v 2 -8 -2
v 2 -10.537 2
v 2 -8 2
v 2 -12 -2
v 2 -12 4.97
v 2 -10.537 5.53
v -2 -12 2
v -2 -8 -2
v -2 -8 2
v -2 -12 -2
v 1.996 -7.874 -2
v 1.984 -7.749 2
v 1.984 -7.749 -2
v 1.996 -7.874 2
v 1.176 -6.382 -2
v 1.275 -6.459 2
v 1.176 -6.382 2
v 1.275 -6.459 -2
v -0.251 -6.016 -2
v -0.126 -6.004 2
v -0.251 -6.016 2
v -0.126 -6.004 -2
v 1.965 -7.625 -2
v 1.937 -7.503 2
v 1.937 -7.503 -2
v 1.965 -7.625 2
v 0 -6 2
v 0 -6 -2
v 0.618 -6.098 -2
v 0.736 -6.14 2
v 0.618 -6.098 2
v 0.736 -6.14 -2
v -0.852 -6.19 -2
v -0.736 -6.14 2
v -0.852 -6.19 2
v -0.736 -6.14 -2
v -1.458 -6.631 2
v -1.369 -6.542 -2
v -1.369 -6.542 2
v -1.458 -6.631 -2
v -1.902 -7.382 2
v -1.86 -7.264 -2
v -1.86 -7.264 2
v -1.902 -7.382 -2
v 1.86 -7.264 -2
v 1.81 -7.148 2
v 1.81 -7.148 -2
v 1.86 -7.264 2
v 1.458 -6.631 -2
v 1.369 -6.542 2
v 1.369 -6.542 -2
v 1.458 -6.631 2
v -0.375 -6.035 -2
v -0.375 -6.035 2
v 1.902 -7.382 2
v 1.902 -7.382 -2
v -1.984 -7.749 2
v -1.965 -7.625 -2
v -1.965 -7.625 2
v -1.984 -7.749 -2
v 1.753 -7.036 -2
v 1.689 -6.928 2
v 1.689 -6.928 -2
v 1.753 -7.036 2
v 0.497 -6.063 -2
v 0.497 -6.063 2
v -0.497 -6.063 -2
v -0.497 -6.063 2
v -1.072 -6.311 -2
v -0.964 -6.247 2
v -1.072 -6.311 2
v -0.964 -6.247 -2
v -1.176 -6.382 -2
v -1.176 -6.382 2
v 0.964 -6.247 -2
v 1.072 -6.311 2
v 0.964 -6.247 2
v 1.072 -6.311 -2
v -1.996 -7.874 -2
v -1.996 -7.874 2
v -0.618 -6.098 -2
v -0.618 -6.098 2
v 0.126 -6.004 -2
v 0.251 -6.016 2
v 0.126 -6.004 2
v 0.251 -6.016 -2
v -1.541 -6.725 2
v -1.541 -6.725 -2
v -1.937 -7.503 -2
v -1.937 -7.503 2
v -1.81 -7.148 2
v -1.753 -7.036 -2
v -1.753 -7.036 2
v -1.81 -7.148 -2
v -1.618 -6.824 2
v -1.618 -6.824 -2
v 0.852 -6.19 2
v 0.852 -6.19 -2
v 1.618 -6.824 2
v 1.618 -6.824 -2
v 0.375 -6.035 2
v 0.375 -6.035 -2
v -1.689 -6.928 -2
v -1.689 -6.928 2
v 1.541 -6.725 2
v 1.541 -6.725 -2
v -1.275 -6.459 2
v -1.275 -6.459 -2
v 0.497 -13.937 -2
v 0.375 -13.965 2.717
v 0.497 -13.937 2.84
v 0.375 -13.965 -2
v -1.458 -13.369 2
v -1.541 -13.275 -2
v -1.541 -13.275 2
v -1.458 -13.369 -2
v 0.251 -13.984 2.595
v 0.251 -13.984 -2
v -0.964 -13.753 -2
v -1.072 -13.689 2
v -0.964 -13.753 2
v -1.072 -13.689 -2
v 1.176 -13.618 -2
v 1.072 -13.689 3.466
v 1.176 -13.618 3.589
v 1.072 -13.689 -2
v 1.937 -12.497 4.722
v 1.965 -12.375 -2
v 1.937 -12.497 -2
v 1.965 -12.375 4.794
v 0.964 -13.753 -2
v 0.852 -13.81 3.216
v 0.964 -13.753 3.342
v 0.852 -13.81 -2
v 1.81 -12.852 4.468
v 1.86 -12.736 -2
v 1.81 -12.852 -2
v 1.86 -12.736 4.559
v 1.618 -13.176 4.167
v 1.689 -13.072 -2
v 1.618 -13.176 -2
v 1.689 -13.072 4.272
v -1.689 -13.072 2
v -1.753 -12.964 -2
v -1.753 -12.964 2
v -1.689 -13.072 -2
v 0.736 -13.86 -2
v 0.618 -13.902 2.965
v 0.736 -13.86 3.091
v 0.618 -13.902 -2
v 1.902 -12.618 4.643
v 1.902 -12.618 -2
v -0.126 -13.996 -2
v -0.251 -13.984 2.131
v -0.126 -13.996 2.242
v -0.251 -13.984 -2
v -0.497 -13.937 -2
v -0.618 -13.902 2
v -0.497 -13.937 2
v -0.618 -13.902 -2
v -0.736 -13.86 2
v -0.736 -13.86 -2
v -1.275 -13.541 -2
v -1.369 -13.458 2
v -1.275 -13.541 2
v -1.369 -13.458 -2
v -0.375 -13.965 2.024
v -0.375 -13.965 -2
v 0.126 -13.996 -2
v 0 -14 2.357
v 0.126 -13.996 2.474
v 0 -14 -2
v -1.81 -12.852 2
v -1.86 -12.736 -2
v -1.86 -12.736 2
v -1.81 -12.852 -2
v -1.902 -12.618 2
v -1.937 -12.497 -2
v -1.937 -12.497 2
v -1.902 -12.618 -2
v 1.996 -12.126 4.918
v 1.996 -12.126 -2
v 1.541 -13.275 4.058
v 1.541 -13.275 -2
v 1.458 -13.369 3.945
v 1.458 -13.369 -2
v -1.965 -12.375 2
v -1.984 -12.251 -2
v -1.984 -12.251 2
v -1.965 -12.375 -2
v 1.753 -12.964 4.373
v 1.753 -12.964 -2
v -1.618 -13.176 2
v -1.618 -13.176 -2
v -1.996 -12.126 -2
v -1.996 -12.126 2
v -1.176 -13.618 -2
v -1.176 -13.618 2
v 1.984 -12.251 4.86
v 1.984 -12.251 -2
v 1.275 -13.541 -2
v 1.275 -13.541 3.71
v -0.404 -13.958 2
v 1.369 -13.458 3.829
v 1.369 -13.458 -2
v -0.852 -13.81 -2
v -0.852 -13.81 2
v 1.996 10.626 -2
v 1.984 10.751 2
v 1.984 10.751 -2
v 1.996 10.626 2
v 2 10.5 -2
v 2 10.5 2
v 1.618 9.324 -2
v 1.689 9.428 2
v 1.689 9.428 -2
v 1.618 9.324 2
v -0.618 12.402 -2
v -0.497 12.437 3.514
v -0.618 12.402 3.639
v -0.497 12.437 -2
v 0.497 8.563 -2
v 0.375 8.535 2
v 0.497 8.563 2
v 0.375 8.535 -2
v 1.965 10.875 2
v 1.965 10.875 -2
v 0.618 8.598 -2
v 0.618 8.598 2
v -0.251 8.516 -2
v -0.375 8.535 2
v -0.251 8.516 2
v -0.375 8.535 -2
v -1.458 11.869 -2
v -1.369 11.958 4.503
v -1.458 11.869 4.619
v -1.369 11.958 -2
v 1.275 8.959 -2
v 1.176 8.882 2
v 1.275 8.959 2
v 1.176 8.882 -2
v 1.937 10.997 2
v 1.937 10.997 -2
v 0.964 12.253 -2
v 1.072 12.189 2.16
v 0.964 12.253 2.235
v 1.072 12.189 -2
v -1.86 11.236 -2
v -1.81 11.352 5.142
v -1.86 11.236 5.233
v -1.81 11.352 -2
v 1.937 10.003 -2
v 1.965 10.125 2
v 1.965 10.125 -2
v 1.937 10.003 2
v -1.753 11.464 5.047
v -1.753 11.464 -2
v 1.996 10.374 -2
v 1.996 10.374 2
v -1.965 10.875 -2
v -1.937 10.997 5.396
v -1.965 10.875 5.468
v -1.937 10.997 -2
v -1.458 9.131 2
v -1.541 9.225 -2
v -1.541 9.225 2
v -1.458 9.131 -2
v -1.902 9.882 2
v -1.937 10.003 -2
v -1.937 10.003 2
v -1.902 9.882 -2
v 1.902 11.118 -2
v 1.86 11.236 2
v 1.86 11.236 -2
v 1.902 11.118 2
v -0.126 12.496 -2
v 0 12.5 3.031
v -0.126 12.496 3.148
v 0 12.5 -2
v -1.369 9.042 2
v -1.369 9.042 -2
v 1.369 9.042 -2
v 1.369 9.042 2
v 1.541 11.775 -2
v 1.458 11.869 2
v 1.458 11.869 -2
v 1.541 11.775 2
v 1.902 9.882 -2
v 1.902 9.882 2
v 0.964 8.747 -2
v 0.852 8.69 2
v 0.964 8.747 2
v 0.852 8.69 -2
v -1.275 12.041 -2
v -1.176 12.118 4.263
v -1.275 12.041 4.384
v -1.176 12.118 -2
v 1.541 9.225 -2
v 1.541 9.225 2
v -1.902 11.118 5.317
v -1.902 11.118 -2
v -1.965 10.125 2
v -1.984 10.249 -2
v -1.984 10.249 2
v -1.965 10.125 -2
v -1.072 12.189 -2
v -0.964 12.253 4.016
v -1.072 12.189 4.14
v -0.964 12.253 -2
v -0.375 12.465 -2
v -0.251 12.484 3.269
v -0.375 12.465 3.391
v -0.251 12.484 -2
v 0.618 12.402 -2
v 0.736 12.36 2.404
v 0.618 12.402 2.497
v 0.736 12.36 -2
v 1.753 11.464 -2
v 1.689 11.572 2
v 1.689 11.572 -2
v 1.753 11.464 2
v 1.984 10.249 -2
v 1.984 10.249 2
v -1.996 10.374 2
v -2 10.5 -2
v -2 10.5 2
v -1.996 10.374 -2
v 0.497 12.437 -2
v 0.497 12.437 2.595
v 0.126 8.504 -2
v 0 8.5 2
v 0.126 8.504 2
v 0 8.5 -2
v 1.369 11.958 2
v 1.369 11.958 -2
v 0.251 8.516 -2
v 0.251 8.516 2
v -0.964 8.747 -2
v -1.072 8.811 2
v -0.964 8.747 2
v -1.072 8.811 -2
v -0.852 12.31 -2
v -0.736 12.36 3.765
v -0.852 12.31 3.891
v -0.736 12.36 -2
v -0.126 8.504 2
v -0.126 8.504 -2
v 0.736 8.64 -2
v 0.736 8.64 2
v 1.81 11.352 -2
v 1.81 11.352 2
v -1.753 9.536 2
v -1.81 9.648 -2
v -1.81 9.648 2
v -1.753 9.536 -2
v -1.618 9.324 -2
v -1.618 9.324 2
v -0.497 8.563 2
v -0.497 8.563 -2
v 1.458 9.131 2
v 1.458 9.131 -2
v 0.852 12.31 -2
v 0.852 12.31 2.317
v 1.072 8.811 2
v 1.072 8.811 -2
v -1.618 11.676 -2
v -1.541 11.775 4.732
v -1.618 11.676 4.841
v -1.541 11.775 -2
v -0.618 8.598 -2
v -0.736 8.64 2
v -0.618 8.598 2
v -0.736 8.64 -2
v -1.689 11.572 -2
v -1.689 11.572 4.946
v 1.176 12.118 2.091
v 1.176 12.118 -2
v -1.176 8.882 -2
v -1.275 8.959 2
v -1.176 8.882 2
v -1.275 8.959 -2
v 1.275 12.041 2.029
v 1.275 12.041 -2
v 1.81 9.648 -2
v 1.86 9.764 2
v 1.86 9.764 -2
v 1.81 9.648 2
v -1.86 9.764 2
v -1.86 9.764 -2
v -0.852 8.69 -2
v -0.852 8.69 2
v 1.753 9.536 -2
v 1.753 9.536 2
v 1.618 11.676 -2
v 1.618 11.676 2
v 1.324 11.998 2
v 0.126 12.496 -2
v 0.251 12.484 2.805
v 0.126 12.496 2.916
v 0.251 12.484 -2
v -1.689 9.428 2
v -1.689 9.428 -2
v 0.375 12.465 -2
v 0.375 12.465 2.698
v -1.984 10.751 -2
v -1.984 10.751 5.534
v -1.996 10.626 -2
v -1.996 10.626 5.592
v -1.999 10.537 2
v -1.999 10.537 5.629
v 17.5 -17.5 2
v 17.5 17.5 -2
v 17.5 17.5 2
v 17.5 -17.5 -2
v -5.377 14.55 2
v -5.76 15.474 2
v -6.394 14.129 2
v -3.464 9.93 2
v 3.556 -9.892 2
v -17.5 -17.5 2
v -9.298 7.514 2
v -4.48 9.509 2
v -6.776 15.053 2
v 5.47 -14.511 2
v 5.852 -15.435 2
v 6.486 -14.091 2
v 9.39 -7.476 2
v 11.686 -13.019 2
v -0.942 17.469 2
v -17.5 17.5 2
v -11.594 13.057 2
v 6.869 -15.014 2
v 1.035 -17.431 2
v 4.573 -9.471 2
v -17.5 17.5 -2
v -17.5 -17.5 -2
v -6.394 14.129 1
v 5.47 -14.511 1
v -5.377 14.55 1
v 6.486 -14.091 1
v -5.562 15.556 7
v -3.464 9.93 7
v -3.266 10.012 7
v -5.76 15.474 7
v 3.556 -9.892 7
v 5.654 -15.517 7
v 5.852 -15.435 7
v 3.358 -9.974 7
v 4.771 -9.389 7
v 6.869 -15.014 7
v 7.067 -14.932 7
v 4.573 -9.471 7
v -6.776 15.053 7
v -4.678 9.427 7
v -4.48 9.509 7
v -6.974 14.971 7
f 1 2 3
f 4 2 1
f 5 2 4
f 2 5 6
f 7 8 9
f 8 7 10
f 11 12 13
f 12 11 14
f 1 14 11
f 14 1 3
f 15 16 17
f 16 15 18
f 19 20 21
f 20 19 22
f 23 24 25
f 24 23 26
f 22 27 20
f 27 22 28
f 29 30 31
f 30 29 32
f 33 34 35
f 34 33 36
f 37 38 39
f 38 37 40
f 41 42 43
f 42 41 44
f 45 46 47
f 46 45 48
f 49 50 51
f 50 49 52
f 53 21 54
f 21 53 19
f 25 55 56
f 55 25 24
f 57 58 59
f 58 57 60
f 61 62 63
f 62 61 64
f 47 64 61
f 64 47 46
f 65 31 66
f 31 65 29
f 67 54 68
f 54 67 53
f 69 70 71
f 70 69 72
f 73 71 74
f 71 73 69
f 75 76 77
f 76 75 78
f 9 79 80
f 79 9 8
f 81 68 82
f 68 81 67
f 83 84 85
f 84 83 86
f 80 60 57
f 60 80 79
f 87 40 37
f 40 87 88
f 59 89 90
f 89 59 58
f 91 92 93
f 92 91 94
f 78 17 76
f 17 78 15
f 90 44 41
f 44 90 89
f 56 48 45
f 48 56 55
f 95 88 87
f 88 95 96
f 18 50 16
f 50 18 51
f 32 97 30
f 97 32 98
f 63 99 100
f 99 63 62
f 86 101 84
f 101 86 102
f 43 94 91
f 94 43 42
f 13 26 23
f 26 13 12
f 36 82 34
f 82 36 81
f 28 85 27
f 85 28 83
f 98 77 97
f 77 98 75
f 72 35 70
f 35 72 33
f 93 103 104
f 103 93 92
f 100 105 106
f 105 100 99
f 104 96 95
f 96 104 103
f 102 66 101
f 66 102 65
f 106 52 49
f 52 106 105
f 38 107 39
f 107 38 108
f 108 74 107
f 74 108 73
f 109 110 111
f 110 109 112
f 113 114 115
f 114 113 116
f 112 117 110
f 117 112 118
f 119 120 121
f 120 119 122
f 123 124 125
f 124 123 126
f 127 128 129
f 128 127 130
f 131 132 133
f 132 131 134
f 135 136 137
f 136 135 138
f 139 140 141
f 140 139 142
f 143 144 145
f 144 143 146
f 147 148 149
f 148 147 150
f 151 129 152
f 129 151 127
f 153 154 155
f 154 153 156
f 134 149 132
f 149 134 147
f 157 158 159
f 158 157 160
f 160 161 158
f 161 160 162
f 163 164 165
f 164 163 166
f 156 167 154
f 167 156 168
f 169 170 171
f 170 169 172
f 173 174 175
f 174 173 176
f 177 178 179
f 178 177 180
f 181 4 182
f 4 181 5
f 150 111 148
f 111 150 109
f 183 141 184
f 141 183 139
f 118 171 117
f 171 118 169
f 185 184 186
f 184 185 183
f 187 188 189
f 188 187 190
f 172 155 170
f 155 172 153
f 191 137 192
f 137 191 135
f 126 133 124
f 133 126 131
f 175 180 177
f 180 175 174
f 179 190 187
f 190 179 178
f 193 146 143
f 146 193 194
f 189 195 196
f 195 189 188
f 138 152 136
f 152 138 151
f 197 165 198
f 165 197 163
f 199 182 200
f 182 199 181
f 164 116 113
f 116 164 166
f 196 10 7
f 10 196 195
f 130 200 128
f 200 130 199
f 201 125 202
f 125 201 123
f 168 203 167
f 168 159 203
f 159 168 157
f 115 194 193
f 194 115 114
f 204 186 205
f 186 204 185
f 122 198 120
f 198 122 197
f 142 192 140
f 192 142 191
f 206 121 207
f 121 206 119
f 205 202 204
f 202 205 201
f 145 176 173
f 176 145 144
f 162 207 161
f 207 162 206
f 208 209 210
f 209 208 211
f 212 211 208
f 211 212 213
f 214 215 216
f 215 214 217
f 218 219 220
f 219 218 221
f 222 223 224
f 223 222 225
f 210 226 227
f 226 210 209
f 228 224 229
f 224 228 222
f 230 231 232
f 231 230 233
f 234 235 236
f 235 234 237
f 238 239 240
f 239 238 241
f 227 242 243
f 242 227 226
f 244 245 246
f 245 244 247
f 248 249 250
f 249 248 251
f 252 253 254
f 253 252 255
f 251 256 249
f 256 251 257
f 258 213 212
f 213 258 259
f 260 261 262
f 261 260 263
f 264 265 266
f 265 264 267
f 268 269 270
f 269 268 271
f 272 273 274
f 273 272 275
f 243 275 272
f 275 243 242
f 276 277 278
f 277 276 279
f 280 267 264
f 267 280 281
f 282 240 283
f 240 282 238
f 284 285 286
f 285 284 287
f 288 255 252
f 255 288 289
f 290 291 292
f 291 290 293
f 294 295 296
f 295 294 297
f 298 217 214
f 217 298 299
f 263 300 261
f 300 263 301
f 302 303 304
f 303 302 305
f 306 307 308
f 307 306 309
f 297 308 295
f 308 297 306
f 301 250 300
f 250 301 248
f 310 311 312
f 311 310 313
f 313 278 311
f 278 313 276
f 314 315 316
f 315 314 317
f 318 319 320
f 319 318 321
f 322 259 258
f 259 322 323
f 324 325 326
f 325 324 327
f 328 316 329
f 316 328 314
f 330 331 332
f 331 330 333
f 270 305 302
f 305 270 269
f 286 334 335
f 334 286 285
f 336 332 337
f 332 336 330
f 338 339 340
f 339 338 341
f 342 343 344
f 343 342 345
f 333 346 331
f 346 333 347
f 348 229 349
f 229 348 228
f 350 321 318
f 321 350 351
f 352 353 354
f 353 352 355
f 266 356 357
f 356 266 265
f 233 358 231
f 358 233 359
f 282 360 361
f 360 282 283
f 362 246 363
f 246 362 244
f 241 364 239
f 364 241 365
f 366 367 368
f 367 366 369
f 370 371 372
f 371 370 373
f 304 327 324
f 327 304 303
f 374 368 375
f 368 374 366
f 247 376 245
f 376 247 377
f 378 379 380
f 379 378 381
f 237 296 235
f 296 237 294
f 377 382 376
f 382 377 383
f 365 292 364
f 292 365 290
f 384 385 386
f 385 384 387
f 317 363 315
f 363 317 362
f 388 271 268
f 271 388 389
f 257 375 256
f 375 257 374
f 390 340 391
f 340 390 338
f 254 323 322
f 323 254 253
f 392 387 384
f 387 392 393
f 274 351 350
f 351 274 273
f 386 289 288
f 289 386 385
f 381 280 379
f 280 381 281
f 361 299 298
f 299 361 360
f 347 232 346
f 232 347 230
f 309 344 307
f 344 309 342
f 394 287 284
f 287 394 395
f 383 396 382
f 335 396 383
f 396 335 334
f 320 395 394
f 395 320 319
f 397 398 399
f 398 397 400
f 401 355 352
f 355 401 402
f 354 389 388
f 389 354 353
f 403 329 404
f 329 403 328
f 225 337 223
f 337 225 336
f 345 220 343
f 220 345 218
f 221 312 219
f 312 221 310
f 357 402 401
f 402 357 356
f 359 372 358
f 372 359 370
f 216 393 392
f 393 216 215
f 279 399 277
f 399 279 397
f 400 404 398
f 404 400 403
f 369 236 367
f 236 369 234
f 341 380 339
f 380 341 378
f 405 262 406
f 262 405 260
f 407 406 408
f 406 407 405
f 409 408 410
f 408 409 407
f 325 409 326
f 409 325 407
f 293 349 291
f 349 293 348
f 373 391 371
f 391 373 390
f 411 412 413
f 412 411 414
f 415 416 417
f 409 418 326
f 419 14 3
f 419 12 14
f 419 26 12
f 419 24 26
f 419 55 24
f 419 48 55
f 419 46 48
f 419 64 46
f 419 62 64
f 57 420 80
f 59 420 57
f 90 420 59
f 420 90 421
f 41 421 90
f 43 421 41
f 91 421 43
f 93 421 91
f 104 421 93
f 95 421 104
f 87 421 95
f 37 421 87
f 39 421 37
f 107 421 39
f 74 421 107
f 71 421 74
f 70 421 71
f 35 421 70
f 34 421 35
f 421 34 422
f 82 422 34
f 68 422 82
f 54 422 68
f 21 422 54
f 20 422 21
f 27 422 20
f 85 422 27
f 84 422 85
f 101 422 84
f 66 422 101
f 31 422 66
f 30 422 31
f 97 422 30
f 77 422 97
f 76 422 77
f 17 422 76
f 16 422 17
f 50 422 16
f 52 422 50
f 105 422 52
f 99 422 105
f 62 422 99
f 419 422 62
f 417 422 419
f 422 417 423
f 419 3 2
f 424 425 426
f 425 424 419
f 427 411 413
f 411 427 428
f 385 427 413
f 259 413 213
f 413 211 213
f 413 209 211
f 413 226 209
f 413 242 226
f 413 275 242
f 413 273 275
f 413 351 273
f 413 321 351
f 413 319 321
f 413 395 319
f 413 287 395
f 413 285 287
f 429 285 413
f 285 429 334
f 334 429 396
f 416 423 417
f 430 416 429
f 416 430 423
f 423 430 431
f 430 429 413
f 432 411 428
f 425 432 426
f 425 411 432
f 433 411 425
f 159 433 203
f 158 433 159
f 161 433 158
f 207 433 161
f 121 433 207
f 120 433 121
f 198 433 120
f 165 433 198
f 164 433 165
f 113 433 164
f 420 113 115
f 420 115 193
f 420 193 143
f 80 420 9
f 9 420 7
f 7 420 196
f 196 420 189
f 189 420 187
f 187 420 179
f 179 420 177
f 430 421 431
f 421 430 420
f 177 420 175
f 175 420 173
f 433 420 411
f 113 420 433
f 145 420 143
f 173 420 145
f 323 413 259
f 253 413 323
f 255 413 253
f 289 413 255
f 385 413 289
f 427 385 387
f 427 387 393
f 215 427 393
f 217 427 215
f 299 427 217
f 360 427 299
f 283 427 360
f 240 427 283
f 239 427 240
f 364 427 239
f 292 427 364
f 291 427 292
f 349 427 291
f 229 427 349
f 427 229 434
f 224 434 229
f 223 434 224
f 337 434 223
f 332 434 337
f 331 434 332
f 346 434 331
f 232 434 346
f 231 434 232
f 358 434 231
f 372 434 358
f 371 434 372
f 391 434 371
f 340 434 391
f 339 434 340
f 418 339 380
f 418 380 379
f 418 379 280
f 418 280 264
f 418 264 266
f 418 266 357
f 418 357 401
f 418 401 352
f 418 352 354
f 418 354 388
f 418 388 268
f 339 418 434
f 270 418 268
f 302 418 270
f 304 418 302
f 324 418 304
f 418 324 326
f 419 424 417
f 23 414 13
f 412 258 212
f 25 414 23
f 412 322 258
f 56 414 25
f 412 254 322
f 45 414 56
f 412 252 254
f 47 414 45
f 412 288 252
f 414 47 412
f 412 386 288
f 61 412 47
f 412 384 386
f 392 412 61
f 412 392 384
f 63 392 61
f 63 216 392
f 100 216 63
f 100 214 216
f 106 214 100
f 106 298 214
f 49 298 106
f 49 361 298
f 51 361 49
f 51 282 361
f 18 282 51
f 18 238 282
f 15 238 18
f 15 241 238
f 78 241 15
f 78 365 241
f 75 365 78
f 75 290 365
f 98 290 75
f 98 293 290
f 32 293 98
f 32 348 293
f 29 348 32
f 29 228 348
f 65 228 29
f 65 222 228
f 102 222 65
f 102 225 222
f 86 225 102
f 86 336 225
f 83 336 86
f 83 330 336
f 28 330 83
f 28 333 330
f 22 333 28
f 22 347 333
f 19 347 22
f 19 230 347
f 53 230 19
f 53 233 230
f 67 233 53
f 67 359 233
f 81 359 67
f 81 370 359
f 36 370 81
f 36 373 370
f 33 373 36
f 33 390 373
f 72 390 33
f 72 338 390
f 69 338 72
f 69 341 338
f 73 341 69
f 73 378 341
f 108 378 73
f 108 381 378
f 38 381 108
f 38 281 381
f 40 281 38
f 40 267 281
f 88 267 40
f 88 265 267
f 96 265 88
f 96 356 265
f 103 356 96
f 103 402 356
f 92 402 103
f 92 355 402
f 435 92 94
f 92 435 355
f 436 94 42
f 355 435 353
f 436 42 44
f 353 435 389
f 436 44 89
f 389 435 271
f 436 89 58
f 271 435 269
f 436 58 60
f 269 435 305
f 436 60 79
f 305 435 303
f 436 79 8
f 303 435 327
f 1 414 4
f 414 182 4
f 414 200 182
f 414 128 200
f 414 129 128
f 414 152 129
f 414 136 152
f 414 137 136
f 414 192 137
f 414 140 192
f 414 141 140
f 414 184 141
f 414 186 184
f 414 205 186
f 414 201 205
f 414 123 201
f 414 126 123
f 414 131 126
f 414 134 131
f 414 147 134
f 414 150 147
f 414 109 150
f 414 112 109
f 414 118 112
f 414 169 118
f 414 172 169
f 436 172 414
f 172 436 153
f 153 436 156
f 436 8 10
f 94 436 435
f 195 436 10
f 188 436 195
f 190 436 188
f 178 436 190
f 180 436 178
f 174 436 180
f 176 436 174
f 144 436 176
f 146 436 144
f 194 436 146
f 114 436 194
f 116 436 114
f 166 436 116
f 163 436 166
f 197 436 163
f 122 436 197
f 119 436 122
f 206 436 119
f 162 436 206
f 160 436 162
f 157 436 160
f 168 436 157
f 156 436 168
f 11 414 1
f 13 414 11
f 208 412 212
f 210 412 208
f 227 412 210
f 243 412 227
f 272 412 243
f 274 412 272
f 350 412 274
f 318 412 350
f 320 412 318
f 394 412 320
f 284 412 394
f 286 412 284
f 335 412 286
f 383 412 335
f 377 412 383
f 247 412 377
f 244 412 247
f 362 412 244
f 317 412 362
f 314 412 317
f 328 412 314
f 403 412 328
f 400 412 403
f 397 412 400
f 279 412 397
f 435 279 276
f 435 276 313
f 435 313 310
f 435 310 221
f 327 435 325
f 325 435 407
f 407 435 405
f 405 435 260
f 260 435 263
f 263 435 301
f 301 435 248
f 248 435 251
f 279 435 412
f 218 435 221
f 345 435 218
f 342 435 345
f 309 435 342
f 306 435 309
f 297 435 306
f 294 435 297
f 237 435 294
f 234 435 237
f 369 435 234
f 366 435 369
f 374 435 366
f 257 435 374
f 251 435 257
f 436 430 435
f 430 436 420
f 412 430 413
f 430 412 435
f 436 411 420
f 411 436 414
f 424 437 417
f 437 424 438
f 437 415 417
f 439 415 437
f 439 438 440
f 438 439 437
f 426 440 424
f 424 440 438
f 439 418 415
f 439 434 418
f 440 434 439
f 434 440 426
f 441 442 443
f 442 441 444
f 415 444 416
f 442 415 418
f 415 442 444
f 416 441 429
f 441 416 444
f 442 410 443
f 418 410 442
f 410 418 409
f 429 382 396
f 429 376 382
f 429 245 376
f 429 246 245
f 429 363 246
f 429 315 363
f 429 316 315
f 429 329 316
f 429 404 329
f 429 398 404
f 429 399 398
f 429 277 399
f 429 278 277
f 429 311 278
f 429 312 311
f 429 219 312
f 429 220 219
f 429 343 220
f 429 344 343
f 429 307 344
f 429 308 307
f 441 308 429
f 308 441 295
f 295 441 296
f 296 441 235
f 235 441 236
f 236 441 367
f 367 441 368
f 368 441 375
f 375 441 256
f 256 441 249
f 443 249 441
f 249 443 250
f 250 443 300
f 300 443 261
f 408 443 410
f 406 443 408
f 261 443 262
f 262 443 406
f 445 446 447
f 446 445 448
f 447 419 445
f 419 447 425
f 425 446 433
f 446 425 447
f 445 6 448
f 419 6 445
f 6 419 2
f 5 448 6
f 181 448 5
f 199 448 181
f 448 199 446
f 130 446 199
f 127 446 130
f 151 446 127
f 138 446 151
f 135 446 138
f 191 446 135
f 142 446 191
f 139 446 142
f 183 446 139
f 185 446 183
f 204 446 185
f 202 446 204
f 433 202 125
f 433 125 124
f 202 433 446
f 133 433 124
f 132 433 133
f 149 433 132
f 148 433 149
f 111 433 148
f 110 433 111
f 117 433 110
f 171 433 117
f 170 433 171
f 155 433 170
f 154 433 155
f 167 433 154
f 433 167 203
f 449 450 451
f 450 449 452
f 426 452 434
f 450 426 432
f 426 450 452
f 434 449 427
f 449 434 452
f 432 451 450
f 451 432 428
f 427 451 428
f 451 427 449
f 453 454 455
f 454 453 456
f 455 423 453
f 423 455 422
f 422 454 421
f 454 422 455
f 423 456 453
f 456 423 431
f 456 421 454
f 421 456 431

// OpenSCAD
union()
{

difference()
{
difference()
{
cube([35,35,4], center = true); //base del portamuestras

union()// unión de las piezas que forman los agujeros
{
translate([0,10.5,-5])
cylinder(r=2, h=10, $fn=100); //agujero pequeño

translate([0,-1.5,0]) //añadido en V2
union()//agujero grande
   {
translate([0,-8.5,-0])
cube([4,4,10], center = true); 
translate([0,-6.5,-5])
cylinder(r=2, h=10, $fn=100);
translate([0,-10.5,-5])
cylinder(r=2, h=10, $fn=100);
   }
   }
}
rotate([0,0,45/2])
translate([-0.5,-15.5,1])
cube([1.1,31,30], center = false); //ranura para el dispositivo
}
difference()
{
rotate([0,0,45/2])
union()
{
translate([3.35,13.5,0])//4 piezas que sujetan los substratos
difference()
{
translate([0,0,4.5])
cube([5.5,6,5], center = true);

translate([1,0,7])
rotate([0,45,0])
cube([10,10,5], center = true);
}
rotate([0,0,180])
translate([3.25,13.5,0])
difference()
{
translate([0,0,4.5])
cube([5.5,6,5], center = true);

translate([1,0,7])
rotate([0,45,0])
cube([10,10,5], center = true);
}
rotate([0,0,180])
translate([3.15,13.5,0])
rotate([0,0,180])
translate([6.5,0,0])
difference()
{
translate([0,0,4.5])
cube([5.5,6,5], center = true);

translate([1,0,7])
rotate([0,45,0])
cube([10,10,5], center = true);
}
translate([3.25,13.5,0])
rotate([0,0,180])
translate([6.5,0,0])
difference()
{
translate([0,0,4.5])
cube([5.5,6,5], center = true);

translate([1,0,7])
rotate([0,45,0])
cube([10,10,5], center = true);
}
}

union()// unión de las piezas que forman los agujeros
{

translate([0,10.5,-5])
cylinder(r=2, h=20, $fn=100); //agujero pequeño

translate([0,-1.5,0]) //añadido en V2
union()//agujero grande
   {
translate([0,-8.5,-0])
cube([4,4,20], center = true); 
translate([0,-6.5,-5])
cylinder(r=2, h=20, $fn=100);
translate([0,-10.5,-5])
cylinder(r=2, h=20, $fn=100);
   }
   }
   
   }
}
